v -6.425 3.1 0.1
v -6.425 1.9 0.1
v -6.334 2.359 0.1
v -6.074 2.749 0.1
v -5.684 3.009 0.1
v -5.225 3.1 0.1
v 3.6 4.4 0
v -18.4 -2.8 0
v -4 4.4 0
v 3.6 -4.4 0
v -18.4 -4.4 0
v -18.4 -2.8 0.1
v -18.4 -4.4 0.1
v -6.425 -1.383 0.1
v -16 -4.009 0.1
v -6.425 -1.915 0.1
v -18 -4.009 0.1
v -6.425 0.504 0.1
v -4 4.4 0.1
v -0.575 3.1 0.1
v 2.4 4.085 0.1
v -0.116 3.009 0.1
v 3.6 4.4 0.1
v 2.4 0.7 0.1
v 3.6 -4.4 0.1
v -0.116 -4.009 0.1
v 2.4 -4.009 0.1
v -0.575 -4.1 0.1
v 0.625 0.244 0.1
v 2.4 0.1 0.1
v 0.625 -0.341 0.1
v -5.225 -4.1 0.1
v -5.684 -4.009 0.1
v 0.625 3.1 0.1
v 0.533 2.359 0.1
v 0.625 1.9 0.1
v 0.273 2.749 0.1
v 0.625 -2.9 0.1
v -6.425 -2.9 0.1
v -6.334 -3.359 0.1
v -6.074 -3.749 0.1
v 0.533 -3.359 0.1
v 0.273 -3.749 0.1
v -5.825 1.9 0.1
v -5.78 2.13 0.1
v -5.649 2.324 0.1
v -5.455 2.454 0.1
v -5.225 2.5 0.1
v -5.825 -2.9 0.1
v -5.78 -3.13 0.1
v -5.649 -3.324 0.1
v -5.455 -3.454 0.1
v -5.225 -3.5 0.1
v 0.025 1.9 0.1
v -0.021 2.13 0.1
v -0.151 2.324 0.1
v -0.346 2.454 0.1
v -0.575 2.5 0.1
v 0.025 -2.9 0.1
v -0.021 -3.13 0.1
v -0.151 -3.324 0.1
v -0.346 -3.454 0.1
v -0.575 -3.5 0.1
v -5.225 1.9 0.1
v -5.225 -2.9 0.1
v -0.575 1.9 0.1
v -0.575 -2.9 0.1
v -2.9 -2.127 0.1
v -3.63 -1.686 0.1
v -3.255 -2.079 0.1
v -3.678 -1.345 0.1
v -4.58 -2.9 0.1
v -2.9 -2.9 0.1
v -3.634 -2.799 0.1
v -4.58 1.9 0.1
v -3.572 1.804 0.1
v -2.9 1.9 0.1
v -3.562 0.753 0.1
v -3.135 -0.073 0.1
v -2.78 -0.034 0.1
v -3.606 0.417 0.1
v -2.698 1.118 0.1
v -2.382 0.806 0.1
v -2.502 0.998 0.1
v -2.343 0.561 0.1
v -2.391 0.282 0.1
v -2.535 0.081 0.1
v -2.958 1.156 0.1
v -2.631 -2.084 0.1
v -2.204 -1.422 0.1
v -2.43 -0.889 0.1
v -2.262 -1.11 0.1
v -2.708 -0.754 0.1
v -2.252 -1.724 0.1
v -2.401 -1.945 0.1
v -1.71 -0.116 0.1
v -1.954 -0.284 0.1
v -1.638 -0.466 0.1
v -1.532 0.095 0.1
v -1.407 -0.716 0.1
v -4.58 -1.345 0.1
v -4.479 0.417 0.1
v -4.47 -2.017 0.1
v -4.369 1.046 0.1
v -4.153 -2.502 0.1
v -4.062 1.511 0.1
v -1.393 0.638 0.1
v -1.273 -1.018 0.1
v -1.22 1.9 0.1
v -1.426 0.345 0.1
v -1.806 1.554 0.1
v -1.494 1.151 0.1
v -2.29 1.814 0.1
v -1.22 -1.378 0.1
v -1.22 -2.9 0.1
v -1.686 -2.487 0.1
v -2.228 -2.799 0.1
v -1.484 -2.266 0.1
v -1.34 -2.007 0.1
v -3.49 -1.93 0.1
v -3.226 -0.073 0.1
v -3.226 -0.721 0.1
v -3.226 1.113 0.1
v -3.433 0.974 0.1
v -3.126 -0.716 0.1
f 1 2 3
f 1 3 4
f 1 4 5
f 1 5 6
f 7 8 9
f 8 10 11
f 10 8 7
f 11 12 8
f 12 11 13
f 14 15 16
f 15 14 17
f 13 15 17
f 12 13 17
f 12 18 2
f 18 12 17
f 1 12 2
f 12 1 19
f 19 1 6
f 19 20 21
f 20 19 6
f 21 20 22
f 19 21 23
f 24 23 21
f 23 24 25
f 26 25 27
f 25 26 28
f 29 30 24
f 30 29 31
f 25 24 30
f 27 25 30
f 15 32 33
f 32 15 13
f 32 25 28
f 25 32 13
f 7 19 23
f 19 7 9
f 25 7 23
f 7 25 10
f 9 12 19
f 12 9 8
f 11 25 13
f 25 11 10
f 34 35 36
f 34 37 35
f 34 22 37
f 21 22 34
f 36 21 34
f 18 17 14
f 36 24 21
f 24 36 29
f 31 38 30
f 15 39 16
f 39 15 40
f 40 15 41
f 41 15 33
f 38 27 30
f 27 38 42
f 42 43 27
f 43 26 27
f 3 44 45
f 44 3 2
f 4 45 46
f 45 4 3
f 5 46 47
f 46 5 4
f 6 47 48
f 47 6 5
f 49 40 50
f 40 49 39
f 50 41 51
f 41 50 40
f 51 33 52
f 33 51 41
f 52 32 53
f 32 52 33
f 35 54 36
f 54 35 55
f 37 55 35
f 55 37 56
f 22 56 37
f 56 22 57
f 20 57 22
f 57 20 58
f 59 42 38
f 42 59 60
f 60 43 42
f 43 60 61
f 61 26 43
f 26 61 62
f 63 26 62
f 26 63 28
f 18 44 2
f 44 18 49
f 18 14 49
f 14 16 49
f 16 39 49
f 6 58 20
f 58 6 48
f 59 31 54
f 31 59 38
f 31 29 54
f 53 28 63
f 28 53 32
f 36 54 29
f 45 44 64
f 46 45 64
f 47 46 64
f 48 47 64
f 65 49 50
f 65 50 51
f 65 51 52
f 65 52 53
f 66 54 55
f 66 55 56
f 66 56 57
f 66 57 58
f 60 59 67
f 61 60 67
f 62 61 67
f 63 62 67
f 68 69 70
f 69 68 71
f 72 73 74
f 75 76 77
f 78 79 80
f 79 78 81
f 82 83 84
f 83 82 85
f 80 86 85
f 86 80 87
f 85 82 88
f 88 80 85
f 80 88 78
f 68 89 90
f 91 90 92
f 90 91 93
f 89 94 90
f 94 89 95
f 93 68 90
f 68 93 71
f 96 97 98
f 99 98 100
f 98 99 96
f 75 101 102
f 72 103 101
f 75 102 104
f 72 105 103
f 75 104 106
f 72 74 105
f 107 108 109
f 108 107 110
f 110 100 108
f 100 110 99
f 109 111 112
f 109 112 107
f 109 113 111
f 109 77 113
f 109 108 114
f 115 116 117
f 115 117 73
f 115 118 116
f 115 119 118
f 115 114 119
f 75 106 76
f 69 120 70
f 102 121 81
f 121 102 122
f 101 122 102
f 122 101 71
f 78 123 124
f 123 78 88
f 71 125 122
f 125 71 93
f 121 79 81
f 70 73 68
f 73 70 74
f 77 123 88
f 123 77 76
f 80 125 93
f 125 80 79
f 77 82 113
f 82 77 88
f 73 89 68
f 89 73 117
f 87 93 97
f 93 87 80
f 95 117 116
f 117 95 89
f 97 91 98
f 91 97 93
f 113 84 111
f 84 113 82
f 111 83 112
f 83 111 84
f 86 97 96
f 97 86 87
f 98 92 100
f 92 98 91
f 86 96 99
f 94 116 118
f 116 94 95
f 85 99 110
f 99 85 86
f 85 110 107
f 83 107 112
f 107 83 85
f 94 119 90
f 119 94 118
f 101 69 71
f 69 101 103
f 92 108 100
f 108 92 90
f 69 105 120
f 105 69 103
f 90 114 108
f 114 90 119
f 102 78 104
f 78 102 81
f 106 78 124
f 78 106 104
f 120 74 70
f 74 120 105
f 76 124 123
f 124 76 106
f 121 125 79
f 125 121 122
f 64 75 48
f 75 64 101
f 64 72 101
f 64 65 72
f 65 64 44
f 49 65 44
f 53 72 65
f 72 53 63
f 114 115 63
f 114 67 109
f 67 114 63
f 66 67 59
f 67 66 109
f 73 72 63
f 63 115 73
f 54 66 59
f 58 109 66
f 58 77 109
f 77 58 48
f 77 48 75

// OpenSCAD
use <../lib.scad>
use <s/821435as01.scad>
use <s/821435as02.scad>
use <s/821435as03.scad>
use <../p/type-swiss721bt-bold-n3.scad>
$fa=1; $fs=0.2;
function ldraw_lib__821435f(realsolid=false) = [
// 0 Sticker with Black/Red Triangles and Racing Number "3", Left
// 0 Name: 821435f.dat
// 0 Author: Ulrich Röder [UR]
// 0 !LDRAW_ORG Part UPDATE 2019-01
// 0 !LICENSE Licensed under CC BY 2.0 and CC BY 4.0 : see CAreadme.txt
// 
// 0 BFC CERTIFY CCW
  [0,"BFC","CERTIFY"],
  [0,"BFC","CCW"],
// 
// 0 !KEYWORDS cup, Racers, Set 6539
// 
// 0 !HISTORY 2019-06-28 [PTadmin] Official Update 2019-01
// 
// 
// 0 // Main
// 1 16 0 0 0 -1 0 0 0 1 0 0 0 1 s\821435as03.dat
  [1,16,0,0,0,-1,0,0,0,1,0,0,0,1, ldraw_lib__s__821435as03(realsolid)],
// 
// 0 // Black
// 1 0 0 0 0 -1 0 0 0 1 0 0 0 1 s\821435as02.dat
  [1,0,0,0,0,-1,0,0,0,1,0,0,0,1, ldraw_lib__s__821435as02(realsolid)],
// 
// 0 // Red
// 1 4 0 0 0 -1 0 0 0 1 0 0 0 1 s\821435as01.dat
  [1,4,0,0,0,-1,0,0,0,1,0,0,0,1, ldraw_lib__s__821435as01(realsolid)],
// 
// 0 // White
// 1 15 -7.25 -.25 -1.25 12 0 0 0 1 0 0 0 12 type-swiss721bt-bold-n3.dat
  [1,15,-7.25,-.25,-1.25,12,0,0,0,1,0,0,0,12, ldraw_lib__type_swiss721bt_bold_n3(realsolid)],
// 4 15 -11.45 -.25 -3.362 -11.45 -.25 4.75 -13.063 -.25 6.25 -13.063 -.25 4.75
  [4,15,-11.45,-.25,-3.362,-11.45,-.25,4.75,-13.063,-.25,6.25,-13.063,-.25,4.75],
// 3 15 -13.063 -.25 4.75 -11.45 -.25 -7.25 -11.45 -.25 -3.362
  [3,15,-13.063,-.25,4.75,-11.45,-.25,-7.25,-11.45,-.25,-3.362],
// 4 15 -13.063 -.25 4.75 -14.563 -.25 4.75 -13.063 -.25 -7.25 -11.45 -.25 -7.25
  [4,15,-13.063,-.25,4.75,-14.563,-.25,4.75,-13.063,-.25,-7.25,-11.45,-.25,-7.25],
// 3 15 -14.563 -.25 -7.25 -13.063 -.25 -7.25 -14.563 -.25 4.75
  [3,15,-14.563,-.25,-7.25,-13.063,-.25,-7.25,-14.563,-.25,4.75],
// 4 15 -1.438 -.25 -8.75 -11.45 -.25 -7.25 -13.063 -.25 -7.25 -13.063 -.25 -8.75
  [4,15,-1.438,-.25,-8.75,-11.45,-.25,-7.25,-13.063,-.25,-7.25,-13.063,-.25,-8.75],
// 3 15 -3.05 -.25 -3.446 -3.05 -.25 -7.25 -1.438 -.25 -8.75
  [3,15,-3.05,-.25,-3.446,-3.05,-.25,-7.25,-1.438,-.25,-8.75],
// 4 15 -3.05 -.25 4.75 -3.05 -.25 -3.446 -1.438 -.25 -8.75 -1.438 -.25 -7.25
  [4,15,-3.05,-.25,4.75,-3.05,-.25,-3.446,-1.438,-.25,-8.75,-1.438,-.25,-7.25],
// 4 15 -1.438 -.25 4.75 -3.05 -.25 4.75 -1.438 -.25 -7.25 .062 -.25 -7.25
  [4,15,-1.438,-.25,4.75,-3.05,-.25,4.75,-1.438,-.25,-7.25,.062,-.25,-7.25],
// 3 15 -7.25 -.25 -7.25 -11.45 -.25 -7.25 -1.438 -.25 -8.75
  [3,15,-7.25,-.25,-7.25,-11.45,-.25,-7.25,-1.438,-.25,-8.75],
// 3 15 -1.438 -.25 -8.75 -3.05 -.25 -7.25 -7.25 -.25 -7.25
  [3,15,-1.438,-.25,-8.75,-3.05,-.25,-7.25,-7.25,-.25,-7.25],
// 3 15 .062 -.25 4.75 -1.438 -.25 4.75 .062 -.25 -7.25
  [3,15,.062,-.25,4.75,-1.438,-.25,4.75,.062,-.25,-7.25],
// 3 15 -1.438 -.25 6.25 -3.05 -.25 4.75 -1.438 -.25 4.75
  [3,15,-1.438,-.25,6.25,-3.05,-.25,4.75,-1.438,-.25,4.75],
// 4 15 -13.063 -.25 6.25 -7.25 -.25 4.75 -3.05 -.25 4.75 -1.438 -.25 6.25
  [4,15,-13.063,-.25,6.25,-7.25,-.25,4.75,-3.05,-.25,4.75,-1.438,-.25,6.25],
// 3 15 -7.25 -.25 4.75 -13.063 -.25 6.25 -11.45 -.25 4.75
  [3,15,-7.25,-.25,4.75,-13.063,-.25,6.25,-11.45,-.25,4.75],
];
module ldraw_lib__821435f(step=0, col=false, unit=2/5, alt=false, line=0.2, solid=!$preview)
    makepoly(ldraw_lib__821435f(solid), step=step, col=col, unit=unit, alt=alt, line=line, solid=solid);
ldraw_lib__821435f(line=0.2);
